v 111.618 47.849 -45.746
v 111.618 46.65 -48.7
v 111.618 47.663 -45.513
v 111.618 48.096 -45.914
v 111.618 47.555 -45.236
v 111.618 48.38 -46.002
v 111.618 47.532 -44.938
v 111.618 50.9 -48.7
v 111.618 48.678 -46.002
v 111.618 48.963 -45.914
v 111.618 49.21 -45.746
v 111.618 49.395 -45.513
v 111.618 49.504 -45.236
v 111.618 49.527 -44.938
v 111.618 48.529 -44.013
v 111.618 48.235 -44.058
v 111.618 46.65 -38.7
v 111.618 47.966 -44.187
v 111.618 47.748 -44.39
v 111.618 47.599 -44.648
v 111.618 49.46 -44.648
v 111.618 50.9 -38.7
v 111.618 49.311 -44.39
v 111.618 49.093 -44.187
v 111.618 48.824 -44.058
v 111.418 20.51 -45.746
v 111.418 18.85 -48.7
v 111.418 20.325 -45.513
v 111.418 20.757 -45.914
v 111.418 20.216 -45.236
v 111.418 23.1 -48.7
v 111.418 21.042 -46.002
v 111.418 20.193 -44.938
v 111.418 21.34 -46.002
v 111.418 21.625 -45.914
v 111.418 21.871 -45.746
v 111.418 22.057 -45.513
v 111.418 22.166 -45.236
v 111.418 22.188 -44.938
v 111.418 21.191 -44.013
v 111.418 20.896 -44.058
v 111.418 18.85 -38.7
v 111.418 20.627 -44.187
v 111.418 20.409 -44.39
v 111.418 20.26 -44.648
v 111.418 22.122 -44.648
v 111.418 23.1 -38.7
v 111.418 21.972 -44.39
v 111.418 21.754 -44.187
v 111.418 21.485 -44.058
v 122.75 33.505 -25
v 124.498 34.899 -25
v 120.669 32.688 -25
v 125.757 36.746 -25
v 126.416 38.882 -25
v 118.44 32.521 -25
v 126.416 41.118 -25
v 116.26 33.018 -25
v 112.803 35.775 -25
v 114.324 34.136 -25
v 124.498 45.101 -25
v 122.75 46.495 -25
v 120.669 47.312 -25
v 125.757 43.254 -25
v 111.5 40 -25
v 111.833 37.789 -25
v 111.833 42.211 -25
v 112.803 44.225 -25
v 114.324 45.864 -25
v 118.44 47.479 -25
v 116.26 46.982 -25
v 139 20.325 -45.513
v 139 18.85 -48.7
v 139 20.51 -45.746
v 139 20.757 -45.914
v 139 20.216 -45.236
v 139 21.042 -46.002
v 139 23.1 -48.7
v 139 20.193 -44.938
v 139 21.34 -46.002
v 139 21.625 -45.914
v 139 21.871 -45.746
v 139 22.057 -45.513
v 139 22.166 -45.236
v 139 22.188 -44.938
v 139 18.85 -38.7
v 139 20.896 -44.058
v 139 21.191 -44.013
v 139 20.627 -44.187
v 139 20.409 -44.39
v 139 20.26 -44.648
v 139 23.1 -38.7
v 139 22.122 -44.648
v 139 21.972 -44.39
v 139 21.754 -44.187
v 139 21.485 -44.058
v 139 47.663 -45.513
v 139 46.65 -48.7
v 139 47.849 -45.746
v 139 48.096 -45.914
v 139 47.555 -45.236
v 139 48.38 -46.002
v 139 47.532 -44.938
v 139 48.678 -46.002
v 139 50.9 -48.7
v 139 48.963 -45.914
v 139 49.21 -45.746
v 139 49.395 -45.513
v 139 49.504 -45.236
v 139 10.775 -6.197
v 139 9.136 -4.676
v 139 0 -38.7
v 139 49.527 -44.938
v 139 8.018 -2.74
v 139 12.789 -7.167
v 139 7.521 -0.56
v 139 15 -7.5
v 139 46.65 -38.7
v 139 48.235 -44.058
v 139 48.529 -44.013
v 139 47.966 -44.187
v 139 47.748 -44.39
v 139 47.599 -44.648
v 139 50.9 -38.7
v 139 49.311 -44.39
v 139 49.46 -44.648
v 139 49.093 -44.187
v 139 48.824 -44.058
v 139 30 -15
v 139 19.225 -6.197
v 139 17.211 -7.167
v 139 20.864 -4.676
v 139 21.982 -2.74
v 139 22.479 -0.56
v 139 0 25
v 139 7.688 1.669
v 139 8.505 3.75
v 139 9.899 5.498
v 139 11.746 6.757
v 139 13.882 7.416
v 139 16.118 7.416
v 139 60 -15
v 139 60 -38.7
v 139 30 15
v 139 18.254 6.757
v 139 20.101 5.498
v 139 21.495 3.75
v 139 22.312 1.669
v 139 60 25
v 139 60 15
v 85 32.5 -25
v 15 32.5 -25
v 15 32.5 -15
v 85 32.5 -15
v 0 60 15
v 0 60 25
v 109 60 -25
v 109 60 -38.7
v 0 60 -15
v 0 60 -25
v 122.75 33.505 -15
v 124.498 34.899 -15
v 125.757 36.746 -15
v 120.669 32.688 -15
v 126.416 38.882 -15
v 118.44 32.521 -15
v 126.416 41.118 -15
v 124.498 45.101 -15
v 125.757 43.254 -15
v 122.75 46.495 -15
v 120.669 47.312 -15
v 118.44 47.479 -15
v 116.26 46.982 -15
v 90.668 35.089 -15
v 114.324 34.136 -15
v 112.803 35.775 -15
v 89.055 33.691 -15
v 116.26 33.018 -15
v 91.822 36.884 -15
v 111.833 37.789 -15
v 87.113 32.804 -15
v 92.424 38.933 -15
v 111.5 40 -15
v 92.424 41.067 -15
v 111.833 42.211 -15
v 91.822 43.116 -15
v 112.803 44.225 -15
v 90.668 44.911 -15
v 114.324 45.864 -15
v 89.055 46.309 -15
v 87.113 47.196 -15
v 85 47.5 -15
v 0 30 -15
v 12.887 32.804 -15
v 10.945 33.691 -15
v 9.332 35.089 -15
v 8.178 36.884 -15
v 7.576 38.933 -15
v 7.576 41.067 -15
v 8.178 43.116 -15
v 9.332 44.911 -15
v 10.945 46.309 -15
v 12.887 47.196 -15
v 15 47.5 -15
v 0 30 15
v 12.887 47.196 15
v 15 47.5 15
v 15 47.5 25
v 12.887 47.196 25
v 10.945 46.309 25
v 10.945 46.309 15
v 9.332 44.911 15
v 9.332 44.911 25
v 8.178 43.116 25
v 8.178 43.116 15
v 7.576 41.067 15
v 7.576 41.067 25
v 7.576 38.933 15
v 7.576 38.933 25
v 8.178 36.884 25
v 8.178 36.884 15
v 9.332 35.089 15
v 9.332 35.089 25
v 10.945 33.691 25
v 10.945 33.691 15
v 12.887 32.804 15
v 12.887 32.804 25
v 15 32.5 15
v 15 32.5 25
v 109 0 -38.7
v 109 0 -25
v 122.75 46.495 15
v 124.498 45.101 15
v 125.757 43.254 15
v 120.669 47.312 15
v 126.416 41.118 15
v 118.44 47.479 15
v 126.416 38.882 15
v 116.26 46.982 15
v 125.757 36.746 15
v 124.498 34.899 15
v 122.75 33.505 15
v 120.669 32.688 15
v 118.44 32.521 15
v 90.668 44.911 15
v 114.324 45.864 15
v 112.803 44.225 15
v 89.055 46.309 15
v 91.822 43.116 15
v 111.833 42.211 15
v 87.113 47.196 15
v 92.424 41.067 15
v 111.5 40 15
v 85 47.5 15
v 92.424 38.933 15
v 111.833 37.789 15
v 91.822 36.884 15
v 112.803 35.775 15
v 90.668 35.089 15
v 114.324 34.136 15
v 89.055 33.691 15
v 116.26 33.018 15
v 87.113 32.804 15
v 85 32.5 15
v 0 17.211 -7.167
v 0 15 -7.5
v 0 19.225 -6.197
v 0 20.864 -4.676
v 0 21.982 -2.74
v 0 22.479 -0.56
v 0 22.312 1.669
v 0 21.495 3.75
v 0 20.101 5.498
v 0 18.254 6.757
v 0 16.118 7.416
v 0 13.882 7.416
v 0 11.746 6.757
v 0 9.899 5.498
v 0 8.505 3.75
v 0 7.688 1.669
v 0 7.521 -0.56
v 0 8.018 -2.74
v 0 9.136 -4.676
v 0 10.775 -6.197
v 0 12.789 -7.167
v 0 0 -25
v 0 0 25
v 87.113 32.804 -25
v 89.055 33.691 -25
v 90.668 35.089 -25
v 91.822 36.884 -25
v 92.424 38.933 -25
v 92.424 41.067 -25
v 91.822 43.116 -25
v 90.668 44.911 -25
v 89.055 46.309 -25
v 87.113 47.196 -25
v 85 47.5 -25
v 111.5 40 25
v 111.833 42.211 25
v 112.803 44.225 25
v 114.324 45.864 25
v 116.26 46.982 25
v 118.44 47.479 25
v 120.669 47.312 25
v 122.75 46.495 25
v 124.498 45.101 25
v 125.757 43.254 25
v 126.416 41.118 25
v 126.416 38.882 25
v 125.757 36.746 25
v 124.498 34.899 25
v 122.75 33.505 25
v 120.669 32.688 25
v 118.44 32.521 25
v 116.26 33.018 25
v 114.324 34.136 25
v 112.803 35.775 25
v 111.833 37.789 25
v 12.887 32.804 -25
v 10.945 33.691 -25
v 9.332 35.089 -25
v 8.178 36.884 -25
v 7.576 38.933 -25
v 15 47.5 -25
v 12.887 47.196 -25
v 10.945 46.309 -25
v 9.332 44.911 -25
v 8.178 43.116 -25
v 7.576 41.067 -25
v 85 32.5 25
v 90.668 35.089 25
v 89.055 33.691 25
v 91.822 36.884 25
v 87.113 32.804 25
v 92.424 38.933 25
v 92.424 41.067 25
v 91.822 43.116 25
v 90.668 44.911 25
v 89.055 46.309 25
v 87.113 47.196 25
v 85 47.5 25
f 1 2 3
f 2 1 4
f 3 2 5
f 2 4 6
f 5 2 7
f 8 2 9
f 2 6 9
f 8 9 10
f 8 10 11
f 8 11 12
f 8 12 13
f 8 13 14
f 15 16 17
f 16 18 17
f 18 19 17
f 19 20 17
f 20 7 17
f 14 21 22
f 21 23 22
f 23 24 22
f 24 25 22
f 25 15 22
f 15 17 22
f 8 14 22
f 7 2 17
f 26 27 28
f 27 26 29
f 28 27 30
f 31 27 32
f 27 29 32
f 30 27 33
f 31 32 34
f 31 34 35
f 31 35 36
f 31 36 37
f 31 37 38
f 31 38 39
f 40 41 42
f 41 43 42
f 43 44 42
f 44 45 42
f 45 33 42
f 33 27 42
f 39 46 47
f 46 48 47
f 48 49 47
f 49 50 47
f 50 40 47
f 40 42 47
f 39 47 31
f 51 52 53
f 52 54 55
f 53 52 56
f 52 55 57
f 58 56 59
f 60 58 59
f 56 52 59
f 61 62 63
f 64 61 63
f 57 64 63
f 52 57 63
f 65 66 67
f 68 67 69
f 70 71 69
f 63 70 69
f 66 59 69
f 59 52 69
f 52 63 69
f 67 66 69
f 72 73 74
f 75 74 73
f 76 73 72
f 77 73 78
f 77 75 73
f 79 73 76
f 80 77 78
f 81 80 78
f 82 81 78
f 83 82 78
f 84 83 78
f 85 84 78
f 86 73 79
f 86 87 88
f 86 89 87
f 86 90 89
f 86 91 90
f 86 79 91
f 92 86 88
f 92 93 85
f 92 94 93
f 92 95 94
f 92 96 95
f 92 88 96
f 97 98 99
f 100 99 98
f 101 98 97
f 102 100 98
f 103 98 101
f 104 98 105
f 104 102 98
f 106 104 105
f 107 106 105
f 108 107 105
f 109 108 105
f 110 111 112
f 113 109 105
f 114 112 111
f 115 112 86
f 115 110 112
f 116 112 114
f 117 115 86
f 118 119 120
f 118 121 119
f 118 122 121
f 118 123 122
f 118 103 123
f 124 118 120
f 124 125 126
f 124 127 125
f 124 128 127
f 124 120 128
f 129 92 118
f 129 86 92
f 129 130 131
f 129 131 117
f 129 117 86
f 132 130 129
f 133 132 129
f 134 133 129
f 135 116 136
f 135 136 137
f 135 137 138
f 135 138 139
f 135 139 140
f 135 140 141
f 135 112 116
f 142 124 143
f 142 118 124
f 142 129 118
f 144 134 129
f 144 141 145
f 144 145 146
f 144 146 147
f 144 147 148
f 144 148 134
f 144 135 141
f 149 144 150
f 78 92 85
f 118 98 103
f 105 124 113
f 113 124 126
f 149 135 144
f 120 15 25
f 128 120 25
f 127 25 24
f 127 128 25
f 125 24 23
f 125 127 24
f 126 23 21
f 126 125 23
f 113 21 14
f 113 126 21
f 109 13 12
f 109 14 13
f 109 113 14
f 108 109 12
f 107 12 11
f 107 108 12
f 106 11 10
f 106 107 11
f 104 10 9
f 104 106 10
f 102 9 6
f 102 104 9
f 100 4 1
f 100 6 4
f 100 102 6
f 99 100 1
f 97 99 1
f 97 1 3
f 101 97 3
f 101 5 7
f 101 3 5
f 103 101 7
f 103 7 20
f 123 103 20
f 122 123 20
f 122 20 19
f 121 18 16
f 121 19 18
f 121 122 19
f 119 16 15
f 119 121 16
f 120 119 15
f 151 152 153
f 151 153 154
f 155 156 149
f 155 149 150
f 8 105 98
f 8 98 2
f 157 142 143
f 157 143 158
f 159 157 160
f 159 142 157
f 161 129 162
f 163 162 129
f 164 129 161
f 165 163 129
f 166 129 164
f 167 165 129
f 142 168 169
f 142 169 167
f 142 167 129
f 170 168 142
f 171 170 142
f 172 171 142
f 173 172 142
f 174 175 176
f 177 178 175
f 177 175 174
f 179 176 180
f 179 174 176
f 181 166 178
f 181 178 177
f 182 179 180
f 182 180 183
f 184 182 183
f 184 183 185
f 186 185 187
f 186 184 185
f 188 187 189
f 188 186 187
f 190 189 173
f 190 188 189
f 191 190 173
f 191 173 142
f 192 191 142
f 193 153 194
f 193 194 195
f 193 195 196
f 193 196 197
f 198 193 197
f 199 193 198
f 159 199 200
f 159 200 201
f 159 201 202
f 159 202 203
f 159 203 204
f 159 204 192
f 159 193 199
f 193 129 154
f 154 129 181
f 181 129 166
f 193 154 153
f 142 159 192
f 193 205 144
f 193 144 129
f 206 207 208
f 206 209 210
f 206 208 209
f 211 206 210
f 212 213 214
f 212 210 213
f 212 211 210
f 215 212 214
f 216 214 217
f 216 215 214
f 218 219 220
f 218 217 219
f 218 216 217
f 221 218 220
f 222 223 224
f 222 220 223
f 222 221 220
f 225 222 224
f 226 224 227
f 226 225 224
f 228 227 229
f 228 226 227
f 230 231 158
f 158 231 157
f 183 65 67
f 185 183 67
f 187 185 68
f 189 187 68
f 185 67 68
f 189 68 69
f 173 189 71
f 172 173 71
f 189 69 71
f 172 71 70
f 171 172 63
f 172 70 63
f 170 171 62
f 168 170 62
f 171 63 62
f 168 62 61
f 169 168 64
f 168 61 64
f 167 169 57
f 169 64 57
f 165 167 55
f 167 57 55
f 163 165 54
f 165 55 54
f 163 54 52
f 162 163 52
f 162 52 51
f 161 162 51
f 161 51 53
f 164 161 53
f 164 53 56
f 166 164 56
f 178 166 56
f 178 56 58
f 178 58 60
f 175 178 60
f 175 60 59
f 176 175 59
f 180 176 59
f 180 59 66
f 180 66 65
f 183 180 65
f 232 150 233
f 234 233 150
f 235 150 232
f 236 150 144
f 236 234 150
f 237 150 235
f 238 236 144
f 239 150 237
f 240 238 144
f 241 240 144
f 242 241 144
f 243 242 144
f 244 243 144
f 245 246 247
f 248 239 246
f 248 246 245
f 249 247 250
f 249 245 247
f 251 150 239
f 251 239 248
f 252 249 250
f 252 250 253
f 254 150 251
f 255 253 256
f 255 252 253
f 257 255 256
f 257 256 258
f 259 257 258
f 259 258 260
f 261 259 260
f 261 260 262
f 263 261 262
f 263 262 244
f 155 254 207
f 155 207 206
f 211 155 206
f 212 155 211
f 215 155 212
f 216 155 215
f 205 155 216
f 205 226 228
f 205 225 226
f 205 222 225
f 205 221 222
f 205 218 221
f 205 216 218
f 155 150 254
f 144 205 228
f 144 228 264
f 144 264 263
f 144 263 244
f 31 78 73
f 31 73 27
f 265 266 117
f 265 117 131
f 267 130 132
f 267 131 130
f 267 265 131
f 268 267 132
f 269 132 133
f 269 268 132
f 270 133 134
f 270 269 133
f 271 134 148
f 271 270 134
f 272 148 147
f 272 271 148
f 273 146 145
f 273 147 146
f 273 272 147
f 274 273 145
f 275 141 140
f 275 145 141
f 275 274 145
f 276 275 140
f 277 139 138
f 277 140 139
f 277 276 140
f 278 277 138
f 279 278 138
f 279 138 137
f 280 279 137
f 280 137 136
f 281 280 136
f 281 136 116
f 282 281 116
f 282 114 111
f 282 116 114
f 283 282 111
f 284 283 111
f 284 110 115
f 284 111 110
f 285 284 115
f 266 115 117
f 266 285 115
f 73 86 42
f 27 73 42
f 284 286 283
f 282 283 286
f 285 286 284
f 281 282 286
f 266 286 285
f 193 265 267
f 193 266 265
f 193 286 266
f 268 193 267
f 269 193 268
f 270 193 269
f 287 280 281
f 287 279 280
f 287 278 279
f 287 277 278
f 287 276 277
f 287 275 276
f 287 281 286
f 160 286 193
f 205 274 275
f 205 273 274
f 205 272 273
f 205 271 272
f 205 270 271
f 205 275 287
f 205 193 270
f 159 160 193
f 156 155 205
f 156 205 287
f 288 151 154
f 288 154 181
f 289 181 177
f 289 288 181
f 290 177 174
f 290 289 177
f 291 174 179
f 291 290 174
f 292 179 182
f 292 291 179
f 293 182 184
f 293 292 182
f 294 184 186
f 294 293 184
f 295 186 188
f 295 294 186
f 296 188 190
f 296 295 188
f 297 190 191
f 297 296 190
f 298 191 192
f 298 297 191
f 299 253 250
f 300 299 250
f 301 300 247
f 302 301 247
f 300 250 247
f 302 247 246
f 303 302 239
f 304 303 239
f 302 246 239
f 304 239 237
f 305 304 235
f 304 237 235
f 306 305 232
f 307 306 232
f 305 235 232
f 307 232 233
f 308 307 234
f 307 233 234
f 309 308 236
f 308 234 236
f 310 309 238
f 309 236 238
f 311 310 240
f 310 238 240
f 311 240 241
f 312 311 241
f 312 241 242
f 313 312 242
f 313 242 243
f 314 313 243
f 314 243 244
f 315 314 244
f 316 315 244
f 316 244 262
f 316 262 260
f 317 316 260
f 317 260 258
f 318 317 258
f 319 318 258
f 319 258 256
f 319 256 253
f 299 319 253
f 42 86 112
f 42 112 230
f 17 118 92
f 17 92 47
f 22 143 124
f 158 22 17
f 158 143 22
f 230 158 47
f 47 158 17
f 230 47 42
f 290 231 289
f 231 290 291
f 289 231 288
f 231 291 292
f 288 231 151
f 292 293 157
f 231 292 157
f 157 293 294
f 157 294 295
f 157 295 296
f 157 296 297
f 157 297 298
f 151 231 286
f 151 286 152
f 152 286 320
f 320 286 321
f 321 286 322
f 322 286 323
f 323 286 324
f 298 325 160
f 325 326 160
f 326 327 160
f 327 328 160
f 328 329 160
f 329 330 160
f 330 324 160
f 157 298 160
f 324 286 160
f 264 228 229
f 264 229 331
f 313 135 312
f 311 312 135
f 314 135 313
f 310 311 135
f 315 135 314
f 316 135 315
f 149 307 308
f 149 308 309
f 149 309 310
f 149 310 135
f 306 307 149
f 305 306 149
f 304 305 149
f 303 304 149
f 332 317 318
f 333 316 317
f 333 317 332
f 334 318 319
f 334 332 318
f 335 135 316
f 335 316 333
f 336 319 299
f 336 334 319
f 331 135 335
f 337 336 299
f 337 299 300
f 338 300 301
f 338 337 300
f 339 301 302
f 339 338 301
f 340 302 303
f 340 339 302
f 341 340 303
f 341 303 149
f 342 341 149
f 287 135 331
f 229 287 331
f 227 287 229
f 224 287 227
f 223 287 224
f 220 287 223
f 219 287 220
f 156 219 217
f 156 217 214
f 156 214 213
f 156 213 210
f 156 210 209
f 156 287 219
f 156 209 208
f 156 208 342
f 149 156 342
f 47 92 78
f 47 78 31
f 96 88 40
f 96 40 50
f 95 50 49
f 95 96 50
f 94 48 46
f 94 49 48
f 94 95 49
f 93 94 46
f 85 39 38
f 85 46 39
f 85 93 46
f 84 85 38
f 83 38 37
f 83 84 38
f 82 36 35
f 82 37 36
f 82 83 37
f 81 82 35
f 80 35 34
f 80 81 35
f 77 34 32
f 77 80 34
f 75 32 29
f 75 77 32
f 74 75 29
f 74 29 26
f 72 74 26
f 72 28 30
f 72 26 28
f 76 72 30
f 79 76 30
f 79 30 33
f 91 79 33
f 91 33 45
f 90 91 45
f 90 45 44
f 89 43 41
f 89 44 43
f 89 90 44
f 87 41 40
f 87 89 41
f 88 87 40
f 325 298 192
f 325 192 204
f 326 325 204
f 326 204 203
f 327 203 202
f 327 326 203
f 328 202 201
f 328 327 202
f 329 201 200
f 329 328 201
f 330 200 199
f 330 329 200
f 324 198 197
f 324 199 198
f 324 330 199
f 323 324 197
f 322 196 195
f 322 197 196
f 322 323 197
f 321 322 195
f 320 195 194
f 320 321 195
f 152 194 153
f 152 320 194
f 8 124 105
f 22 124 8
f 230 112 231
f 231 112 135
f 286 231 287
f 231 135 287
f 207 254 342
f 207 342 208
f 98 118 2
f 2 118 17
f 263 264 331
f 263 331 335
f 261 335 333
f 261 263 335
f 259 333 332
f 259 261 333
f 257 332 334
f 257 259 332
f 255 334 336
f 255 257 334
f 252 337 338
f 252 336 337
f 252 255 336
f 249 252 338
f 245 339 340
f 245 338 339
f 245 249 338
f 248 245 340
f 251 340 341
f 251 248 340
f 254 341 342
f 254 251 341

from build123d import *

# Parameters (mm, degrees)
BOSS_EXTRUDE1_DEPTH     = 139
SKETCH3_R               = 7.5
CUT_EXTRUDE1_DEPTH      = 160.439643753
CUT_EXTRUDE2_DEPTH      = 154.447059275
CUT_EXTRUDE2_DEPTH_BACK = 154.447059275
SKETCH4_R               = 7.5
SKETCH5_W               = 30
SKETCH5_H               = 60
BOSS_EXTRUDE2_DEPTH     = 13.7
SKETCH6_W               = 27.582278357
SKETCH6_H               = 4.25
SKETCH6_W_2             = 27.382278357
BOSS_EXTRUDE3_DEPTH     = 10
CUT_EXTRUDE3_DEPTH      = 136.757894005
CUT_EXTRUDE3_DEPTH_BACK = 136.757894005
SKETCH7_R               = 1


with BuildPart() as part:
    # Sketch2 → Boss-Extrude1 (new body)
    with BuildSketch(Plane(origin=(0, 0, 0), x_dir=(0, 0, -1), z_dir=(1, 0, 0))):
        Polygon((-15, 30), (15, 30), (15, 60), (25, 60), (25, 51.134717436), (25, 0), (-25, 0), (-25, 60), (-15, 60), align=None)
    extrude(amount=BOSS_EXTRUDE1_DEPTH)

    # Sketch3 → Cut-Extrude1 (cut, through all)
    with BuildSketch(Plane(origin=(0, 0, -25), x_dir=(-1, 0, 0), z_dir=(0, 0, -1))):
        with Locations((-119, 40)):
            Circle(SKETCH3_R)
        with BuildLine():
            Line((-85, 47.5), (-15, 47.5))
            ThreePointArc((-15, 47.5), (-7.5, 40), (-15, 32.5))
            Line((-15, 32.5), (-85, 32.5))
            ThreePointArc((-85, 32.5), (-92.5, 40), (-85, 47.5))
        make_face()
    extrude(amount=-CUT_EXTRUDE1_DEPTH, mode=Mode.SUBTRACT)

    # Sketch4 → Cut-Extrude2 (cut, two sides: drawn at the far end of the back side and taken through both)
    with BuildSketch(Plane(origin=(139, 0, 0), x_dir=(0, 0, -1), z_dir=(1, 0, 0)).offset(-CUT_EXTRUDE2_DEPTH_BACK)):
        with Locations((0, 15)):
            Circle(SKETCH4_R)
    extrude(amount=CUT_EXTRUDE2_DEPTH + CUT_EXTRUDE2_DEPTH_BACK, mode=Mode.SUBTRACT)

    # Sketch5 → Boss-Extrude2 (add)
    with BuildSketch(Plane(origin=(0, 0, -25), x_dir=(-1, 0, 0), z_dir=(0, 0, -1))):
        with Locations((-124, 30)):
            Rectangle(SKETCH5_W, SKETCH5_H)
    extrude(amount=BOSS_EXTRUDE2_DEPTH)

    # Sketch6 → Boss-Extrude3 (add)
    with BuildSketch(Plane(origin=(0, 0, -38.7), x_dir=(-1, 0, 0), z_dir=(0, 0, -1))):
        with Locations((-125.208860821, 20.975)):
            Rectangle(SKETCH6_W, SKETCH6_H)
        with Locations((-125.308860822, 48.775)):
            Rectangle(SKETCH6_W_2, SKETCH6_H)
    extrude(amount=BOSS_EXTRUDE3_DEPTH)

    # Sketch7 → Cut-Extrude3 (cut, two sides: drawn at the far end of the back side and taken through both)
    with BuildSketch(Plane.ZY.offset(-111.617721643).offset(-CUT_EXTRUDE3_DEPTH_BACK)):
        with Locations((-45.013158899, 48.529439721)):
            Circle(SKETCH7_R)
        with Locations((-45.013158899, 21.190661747)):
            Circle(SKETCH7_R)
    extrude(amount=CUT_EXTRUDE3_DEPTH + CUT_EXTRUDE3_DEPTH_BACK, mode=Mode.SUBTRACT)


solid = part.part
